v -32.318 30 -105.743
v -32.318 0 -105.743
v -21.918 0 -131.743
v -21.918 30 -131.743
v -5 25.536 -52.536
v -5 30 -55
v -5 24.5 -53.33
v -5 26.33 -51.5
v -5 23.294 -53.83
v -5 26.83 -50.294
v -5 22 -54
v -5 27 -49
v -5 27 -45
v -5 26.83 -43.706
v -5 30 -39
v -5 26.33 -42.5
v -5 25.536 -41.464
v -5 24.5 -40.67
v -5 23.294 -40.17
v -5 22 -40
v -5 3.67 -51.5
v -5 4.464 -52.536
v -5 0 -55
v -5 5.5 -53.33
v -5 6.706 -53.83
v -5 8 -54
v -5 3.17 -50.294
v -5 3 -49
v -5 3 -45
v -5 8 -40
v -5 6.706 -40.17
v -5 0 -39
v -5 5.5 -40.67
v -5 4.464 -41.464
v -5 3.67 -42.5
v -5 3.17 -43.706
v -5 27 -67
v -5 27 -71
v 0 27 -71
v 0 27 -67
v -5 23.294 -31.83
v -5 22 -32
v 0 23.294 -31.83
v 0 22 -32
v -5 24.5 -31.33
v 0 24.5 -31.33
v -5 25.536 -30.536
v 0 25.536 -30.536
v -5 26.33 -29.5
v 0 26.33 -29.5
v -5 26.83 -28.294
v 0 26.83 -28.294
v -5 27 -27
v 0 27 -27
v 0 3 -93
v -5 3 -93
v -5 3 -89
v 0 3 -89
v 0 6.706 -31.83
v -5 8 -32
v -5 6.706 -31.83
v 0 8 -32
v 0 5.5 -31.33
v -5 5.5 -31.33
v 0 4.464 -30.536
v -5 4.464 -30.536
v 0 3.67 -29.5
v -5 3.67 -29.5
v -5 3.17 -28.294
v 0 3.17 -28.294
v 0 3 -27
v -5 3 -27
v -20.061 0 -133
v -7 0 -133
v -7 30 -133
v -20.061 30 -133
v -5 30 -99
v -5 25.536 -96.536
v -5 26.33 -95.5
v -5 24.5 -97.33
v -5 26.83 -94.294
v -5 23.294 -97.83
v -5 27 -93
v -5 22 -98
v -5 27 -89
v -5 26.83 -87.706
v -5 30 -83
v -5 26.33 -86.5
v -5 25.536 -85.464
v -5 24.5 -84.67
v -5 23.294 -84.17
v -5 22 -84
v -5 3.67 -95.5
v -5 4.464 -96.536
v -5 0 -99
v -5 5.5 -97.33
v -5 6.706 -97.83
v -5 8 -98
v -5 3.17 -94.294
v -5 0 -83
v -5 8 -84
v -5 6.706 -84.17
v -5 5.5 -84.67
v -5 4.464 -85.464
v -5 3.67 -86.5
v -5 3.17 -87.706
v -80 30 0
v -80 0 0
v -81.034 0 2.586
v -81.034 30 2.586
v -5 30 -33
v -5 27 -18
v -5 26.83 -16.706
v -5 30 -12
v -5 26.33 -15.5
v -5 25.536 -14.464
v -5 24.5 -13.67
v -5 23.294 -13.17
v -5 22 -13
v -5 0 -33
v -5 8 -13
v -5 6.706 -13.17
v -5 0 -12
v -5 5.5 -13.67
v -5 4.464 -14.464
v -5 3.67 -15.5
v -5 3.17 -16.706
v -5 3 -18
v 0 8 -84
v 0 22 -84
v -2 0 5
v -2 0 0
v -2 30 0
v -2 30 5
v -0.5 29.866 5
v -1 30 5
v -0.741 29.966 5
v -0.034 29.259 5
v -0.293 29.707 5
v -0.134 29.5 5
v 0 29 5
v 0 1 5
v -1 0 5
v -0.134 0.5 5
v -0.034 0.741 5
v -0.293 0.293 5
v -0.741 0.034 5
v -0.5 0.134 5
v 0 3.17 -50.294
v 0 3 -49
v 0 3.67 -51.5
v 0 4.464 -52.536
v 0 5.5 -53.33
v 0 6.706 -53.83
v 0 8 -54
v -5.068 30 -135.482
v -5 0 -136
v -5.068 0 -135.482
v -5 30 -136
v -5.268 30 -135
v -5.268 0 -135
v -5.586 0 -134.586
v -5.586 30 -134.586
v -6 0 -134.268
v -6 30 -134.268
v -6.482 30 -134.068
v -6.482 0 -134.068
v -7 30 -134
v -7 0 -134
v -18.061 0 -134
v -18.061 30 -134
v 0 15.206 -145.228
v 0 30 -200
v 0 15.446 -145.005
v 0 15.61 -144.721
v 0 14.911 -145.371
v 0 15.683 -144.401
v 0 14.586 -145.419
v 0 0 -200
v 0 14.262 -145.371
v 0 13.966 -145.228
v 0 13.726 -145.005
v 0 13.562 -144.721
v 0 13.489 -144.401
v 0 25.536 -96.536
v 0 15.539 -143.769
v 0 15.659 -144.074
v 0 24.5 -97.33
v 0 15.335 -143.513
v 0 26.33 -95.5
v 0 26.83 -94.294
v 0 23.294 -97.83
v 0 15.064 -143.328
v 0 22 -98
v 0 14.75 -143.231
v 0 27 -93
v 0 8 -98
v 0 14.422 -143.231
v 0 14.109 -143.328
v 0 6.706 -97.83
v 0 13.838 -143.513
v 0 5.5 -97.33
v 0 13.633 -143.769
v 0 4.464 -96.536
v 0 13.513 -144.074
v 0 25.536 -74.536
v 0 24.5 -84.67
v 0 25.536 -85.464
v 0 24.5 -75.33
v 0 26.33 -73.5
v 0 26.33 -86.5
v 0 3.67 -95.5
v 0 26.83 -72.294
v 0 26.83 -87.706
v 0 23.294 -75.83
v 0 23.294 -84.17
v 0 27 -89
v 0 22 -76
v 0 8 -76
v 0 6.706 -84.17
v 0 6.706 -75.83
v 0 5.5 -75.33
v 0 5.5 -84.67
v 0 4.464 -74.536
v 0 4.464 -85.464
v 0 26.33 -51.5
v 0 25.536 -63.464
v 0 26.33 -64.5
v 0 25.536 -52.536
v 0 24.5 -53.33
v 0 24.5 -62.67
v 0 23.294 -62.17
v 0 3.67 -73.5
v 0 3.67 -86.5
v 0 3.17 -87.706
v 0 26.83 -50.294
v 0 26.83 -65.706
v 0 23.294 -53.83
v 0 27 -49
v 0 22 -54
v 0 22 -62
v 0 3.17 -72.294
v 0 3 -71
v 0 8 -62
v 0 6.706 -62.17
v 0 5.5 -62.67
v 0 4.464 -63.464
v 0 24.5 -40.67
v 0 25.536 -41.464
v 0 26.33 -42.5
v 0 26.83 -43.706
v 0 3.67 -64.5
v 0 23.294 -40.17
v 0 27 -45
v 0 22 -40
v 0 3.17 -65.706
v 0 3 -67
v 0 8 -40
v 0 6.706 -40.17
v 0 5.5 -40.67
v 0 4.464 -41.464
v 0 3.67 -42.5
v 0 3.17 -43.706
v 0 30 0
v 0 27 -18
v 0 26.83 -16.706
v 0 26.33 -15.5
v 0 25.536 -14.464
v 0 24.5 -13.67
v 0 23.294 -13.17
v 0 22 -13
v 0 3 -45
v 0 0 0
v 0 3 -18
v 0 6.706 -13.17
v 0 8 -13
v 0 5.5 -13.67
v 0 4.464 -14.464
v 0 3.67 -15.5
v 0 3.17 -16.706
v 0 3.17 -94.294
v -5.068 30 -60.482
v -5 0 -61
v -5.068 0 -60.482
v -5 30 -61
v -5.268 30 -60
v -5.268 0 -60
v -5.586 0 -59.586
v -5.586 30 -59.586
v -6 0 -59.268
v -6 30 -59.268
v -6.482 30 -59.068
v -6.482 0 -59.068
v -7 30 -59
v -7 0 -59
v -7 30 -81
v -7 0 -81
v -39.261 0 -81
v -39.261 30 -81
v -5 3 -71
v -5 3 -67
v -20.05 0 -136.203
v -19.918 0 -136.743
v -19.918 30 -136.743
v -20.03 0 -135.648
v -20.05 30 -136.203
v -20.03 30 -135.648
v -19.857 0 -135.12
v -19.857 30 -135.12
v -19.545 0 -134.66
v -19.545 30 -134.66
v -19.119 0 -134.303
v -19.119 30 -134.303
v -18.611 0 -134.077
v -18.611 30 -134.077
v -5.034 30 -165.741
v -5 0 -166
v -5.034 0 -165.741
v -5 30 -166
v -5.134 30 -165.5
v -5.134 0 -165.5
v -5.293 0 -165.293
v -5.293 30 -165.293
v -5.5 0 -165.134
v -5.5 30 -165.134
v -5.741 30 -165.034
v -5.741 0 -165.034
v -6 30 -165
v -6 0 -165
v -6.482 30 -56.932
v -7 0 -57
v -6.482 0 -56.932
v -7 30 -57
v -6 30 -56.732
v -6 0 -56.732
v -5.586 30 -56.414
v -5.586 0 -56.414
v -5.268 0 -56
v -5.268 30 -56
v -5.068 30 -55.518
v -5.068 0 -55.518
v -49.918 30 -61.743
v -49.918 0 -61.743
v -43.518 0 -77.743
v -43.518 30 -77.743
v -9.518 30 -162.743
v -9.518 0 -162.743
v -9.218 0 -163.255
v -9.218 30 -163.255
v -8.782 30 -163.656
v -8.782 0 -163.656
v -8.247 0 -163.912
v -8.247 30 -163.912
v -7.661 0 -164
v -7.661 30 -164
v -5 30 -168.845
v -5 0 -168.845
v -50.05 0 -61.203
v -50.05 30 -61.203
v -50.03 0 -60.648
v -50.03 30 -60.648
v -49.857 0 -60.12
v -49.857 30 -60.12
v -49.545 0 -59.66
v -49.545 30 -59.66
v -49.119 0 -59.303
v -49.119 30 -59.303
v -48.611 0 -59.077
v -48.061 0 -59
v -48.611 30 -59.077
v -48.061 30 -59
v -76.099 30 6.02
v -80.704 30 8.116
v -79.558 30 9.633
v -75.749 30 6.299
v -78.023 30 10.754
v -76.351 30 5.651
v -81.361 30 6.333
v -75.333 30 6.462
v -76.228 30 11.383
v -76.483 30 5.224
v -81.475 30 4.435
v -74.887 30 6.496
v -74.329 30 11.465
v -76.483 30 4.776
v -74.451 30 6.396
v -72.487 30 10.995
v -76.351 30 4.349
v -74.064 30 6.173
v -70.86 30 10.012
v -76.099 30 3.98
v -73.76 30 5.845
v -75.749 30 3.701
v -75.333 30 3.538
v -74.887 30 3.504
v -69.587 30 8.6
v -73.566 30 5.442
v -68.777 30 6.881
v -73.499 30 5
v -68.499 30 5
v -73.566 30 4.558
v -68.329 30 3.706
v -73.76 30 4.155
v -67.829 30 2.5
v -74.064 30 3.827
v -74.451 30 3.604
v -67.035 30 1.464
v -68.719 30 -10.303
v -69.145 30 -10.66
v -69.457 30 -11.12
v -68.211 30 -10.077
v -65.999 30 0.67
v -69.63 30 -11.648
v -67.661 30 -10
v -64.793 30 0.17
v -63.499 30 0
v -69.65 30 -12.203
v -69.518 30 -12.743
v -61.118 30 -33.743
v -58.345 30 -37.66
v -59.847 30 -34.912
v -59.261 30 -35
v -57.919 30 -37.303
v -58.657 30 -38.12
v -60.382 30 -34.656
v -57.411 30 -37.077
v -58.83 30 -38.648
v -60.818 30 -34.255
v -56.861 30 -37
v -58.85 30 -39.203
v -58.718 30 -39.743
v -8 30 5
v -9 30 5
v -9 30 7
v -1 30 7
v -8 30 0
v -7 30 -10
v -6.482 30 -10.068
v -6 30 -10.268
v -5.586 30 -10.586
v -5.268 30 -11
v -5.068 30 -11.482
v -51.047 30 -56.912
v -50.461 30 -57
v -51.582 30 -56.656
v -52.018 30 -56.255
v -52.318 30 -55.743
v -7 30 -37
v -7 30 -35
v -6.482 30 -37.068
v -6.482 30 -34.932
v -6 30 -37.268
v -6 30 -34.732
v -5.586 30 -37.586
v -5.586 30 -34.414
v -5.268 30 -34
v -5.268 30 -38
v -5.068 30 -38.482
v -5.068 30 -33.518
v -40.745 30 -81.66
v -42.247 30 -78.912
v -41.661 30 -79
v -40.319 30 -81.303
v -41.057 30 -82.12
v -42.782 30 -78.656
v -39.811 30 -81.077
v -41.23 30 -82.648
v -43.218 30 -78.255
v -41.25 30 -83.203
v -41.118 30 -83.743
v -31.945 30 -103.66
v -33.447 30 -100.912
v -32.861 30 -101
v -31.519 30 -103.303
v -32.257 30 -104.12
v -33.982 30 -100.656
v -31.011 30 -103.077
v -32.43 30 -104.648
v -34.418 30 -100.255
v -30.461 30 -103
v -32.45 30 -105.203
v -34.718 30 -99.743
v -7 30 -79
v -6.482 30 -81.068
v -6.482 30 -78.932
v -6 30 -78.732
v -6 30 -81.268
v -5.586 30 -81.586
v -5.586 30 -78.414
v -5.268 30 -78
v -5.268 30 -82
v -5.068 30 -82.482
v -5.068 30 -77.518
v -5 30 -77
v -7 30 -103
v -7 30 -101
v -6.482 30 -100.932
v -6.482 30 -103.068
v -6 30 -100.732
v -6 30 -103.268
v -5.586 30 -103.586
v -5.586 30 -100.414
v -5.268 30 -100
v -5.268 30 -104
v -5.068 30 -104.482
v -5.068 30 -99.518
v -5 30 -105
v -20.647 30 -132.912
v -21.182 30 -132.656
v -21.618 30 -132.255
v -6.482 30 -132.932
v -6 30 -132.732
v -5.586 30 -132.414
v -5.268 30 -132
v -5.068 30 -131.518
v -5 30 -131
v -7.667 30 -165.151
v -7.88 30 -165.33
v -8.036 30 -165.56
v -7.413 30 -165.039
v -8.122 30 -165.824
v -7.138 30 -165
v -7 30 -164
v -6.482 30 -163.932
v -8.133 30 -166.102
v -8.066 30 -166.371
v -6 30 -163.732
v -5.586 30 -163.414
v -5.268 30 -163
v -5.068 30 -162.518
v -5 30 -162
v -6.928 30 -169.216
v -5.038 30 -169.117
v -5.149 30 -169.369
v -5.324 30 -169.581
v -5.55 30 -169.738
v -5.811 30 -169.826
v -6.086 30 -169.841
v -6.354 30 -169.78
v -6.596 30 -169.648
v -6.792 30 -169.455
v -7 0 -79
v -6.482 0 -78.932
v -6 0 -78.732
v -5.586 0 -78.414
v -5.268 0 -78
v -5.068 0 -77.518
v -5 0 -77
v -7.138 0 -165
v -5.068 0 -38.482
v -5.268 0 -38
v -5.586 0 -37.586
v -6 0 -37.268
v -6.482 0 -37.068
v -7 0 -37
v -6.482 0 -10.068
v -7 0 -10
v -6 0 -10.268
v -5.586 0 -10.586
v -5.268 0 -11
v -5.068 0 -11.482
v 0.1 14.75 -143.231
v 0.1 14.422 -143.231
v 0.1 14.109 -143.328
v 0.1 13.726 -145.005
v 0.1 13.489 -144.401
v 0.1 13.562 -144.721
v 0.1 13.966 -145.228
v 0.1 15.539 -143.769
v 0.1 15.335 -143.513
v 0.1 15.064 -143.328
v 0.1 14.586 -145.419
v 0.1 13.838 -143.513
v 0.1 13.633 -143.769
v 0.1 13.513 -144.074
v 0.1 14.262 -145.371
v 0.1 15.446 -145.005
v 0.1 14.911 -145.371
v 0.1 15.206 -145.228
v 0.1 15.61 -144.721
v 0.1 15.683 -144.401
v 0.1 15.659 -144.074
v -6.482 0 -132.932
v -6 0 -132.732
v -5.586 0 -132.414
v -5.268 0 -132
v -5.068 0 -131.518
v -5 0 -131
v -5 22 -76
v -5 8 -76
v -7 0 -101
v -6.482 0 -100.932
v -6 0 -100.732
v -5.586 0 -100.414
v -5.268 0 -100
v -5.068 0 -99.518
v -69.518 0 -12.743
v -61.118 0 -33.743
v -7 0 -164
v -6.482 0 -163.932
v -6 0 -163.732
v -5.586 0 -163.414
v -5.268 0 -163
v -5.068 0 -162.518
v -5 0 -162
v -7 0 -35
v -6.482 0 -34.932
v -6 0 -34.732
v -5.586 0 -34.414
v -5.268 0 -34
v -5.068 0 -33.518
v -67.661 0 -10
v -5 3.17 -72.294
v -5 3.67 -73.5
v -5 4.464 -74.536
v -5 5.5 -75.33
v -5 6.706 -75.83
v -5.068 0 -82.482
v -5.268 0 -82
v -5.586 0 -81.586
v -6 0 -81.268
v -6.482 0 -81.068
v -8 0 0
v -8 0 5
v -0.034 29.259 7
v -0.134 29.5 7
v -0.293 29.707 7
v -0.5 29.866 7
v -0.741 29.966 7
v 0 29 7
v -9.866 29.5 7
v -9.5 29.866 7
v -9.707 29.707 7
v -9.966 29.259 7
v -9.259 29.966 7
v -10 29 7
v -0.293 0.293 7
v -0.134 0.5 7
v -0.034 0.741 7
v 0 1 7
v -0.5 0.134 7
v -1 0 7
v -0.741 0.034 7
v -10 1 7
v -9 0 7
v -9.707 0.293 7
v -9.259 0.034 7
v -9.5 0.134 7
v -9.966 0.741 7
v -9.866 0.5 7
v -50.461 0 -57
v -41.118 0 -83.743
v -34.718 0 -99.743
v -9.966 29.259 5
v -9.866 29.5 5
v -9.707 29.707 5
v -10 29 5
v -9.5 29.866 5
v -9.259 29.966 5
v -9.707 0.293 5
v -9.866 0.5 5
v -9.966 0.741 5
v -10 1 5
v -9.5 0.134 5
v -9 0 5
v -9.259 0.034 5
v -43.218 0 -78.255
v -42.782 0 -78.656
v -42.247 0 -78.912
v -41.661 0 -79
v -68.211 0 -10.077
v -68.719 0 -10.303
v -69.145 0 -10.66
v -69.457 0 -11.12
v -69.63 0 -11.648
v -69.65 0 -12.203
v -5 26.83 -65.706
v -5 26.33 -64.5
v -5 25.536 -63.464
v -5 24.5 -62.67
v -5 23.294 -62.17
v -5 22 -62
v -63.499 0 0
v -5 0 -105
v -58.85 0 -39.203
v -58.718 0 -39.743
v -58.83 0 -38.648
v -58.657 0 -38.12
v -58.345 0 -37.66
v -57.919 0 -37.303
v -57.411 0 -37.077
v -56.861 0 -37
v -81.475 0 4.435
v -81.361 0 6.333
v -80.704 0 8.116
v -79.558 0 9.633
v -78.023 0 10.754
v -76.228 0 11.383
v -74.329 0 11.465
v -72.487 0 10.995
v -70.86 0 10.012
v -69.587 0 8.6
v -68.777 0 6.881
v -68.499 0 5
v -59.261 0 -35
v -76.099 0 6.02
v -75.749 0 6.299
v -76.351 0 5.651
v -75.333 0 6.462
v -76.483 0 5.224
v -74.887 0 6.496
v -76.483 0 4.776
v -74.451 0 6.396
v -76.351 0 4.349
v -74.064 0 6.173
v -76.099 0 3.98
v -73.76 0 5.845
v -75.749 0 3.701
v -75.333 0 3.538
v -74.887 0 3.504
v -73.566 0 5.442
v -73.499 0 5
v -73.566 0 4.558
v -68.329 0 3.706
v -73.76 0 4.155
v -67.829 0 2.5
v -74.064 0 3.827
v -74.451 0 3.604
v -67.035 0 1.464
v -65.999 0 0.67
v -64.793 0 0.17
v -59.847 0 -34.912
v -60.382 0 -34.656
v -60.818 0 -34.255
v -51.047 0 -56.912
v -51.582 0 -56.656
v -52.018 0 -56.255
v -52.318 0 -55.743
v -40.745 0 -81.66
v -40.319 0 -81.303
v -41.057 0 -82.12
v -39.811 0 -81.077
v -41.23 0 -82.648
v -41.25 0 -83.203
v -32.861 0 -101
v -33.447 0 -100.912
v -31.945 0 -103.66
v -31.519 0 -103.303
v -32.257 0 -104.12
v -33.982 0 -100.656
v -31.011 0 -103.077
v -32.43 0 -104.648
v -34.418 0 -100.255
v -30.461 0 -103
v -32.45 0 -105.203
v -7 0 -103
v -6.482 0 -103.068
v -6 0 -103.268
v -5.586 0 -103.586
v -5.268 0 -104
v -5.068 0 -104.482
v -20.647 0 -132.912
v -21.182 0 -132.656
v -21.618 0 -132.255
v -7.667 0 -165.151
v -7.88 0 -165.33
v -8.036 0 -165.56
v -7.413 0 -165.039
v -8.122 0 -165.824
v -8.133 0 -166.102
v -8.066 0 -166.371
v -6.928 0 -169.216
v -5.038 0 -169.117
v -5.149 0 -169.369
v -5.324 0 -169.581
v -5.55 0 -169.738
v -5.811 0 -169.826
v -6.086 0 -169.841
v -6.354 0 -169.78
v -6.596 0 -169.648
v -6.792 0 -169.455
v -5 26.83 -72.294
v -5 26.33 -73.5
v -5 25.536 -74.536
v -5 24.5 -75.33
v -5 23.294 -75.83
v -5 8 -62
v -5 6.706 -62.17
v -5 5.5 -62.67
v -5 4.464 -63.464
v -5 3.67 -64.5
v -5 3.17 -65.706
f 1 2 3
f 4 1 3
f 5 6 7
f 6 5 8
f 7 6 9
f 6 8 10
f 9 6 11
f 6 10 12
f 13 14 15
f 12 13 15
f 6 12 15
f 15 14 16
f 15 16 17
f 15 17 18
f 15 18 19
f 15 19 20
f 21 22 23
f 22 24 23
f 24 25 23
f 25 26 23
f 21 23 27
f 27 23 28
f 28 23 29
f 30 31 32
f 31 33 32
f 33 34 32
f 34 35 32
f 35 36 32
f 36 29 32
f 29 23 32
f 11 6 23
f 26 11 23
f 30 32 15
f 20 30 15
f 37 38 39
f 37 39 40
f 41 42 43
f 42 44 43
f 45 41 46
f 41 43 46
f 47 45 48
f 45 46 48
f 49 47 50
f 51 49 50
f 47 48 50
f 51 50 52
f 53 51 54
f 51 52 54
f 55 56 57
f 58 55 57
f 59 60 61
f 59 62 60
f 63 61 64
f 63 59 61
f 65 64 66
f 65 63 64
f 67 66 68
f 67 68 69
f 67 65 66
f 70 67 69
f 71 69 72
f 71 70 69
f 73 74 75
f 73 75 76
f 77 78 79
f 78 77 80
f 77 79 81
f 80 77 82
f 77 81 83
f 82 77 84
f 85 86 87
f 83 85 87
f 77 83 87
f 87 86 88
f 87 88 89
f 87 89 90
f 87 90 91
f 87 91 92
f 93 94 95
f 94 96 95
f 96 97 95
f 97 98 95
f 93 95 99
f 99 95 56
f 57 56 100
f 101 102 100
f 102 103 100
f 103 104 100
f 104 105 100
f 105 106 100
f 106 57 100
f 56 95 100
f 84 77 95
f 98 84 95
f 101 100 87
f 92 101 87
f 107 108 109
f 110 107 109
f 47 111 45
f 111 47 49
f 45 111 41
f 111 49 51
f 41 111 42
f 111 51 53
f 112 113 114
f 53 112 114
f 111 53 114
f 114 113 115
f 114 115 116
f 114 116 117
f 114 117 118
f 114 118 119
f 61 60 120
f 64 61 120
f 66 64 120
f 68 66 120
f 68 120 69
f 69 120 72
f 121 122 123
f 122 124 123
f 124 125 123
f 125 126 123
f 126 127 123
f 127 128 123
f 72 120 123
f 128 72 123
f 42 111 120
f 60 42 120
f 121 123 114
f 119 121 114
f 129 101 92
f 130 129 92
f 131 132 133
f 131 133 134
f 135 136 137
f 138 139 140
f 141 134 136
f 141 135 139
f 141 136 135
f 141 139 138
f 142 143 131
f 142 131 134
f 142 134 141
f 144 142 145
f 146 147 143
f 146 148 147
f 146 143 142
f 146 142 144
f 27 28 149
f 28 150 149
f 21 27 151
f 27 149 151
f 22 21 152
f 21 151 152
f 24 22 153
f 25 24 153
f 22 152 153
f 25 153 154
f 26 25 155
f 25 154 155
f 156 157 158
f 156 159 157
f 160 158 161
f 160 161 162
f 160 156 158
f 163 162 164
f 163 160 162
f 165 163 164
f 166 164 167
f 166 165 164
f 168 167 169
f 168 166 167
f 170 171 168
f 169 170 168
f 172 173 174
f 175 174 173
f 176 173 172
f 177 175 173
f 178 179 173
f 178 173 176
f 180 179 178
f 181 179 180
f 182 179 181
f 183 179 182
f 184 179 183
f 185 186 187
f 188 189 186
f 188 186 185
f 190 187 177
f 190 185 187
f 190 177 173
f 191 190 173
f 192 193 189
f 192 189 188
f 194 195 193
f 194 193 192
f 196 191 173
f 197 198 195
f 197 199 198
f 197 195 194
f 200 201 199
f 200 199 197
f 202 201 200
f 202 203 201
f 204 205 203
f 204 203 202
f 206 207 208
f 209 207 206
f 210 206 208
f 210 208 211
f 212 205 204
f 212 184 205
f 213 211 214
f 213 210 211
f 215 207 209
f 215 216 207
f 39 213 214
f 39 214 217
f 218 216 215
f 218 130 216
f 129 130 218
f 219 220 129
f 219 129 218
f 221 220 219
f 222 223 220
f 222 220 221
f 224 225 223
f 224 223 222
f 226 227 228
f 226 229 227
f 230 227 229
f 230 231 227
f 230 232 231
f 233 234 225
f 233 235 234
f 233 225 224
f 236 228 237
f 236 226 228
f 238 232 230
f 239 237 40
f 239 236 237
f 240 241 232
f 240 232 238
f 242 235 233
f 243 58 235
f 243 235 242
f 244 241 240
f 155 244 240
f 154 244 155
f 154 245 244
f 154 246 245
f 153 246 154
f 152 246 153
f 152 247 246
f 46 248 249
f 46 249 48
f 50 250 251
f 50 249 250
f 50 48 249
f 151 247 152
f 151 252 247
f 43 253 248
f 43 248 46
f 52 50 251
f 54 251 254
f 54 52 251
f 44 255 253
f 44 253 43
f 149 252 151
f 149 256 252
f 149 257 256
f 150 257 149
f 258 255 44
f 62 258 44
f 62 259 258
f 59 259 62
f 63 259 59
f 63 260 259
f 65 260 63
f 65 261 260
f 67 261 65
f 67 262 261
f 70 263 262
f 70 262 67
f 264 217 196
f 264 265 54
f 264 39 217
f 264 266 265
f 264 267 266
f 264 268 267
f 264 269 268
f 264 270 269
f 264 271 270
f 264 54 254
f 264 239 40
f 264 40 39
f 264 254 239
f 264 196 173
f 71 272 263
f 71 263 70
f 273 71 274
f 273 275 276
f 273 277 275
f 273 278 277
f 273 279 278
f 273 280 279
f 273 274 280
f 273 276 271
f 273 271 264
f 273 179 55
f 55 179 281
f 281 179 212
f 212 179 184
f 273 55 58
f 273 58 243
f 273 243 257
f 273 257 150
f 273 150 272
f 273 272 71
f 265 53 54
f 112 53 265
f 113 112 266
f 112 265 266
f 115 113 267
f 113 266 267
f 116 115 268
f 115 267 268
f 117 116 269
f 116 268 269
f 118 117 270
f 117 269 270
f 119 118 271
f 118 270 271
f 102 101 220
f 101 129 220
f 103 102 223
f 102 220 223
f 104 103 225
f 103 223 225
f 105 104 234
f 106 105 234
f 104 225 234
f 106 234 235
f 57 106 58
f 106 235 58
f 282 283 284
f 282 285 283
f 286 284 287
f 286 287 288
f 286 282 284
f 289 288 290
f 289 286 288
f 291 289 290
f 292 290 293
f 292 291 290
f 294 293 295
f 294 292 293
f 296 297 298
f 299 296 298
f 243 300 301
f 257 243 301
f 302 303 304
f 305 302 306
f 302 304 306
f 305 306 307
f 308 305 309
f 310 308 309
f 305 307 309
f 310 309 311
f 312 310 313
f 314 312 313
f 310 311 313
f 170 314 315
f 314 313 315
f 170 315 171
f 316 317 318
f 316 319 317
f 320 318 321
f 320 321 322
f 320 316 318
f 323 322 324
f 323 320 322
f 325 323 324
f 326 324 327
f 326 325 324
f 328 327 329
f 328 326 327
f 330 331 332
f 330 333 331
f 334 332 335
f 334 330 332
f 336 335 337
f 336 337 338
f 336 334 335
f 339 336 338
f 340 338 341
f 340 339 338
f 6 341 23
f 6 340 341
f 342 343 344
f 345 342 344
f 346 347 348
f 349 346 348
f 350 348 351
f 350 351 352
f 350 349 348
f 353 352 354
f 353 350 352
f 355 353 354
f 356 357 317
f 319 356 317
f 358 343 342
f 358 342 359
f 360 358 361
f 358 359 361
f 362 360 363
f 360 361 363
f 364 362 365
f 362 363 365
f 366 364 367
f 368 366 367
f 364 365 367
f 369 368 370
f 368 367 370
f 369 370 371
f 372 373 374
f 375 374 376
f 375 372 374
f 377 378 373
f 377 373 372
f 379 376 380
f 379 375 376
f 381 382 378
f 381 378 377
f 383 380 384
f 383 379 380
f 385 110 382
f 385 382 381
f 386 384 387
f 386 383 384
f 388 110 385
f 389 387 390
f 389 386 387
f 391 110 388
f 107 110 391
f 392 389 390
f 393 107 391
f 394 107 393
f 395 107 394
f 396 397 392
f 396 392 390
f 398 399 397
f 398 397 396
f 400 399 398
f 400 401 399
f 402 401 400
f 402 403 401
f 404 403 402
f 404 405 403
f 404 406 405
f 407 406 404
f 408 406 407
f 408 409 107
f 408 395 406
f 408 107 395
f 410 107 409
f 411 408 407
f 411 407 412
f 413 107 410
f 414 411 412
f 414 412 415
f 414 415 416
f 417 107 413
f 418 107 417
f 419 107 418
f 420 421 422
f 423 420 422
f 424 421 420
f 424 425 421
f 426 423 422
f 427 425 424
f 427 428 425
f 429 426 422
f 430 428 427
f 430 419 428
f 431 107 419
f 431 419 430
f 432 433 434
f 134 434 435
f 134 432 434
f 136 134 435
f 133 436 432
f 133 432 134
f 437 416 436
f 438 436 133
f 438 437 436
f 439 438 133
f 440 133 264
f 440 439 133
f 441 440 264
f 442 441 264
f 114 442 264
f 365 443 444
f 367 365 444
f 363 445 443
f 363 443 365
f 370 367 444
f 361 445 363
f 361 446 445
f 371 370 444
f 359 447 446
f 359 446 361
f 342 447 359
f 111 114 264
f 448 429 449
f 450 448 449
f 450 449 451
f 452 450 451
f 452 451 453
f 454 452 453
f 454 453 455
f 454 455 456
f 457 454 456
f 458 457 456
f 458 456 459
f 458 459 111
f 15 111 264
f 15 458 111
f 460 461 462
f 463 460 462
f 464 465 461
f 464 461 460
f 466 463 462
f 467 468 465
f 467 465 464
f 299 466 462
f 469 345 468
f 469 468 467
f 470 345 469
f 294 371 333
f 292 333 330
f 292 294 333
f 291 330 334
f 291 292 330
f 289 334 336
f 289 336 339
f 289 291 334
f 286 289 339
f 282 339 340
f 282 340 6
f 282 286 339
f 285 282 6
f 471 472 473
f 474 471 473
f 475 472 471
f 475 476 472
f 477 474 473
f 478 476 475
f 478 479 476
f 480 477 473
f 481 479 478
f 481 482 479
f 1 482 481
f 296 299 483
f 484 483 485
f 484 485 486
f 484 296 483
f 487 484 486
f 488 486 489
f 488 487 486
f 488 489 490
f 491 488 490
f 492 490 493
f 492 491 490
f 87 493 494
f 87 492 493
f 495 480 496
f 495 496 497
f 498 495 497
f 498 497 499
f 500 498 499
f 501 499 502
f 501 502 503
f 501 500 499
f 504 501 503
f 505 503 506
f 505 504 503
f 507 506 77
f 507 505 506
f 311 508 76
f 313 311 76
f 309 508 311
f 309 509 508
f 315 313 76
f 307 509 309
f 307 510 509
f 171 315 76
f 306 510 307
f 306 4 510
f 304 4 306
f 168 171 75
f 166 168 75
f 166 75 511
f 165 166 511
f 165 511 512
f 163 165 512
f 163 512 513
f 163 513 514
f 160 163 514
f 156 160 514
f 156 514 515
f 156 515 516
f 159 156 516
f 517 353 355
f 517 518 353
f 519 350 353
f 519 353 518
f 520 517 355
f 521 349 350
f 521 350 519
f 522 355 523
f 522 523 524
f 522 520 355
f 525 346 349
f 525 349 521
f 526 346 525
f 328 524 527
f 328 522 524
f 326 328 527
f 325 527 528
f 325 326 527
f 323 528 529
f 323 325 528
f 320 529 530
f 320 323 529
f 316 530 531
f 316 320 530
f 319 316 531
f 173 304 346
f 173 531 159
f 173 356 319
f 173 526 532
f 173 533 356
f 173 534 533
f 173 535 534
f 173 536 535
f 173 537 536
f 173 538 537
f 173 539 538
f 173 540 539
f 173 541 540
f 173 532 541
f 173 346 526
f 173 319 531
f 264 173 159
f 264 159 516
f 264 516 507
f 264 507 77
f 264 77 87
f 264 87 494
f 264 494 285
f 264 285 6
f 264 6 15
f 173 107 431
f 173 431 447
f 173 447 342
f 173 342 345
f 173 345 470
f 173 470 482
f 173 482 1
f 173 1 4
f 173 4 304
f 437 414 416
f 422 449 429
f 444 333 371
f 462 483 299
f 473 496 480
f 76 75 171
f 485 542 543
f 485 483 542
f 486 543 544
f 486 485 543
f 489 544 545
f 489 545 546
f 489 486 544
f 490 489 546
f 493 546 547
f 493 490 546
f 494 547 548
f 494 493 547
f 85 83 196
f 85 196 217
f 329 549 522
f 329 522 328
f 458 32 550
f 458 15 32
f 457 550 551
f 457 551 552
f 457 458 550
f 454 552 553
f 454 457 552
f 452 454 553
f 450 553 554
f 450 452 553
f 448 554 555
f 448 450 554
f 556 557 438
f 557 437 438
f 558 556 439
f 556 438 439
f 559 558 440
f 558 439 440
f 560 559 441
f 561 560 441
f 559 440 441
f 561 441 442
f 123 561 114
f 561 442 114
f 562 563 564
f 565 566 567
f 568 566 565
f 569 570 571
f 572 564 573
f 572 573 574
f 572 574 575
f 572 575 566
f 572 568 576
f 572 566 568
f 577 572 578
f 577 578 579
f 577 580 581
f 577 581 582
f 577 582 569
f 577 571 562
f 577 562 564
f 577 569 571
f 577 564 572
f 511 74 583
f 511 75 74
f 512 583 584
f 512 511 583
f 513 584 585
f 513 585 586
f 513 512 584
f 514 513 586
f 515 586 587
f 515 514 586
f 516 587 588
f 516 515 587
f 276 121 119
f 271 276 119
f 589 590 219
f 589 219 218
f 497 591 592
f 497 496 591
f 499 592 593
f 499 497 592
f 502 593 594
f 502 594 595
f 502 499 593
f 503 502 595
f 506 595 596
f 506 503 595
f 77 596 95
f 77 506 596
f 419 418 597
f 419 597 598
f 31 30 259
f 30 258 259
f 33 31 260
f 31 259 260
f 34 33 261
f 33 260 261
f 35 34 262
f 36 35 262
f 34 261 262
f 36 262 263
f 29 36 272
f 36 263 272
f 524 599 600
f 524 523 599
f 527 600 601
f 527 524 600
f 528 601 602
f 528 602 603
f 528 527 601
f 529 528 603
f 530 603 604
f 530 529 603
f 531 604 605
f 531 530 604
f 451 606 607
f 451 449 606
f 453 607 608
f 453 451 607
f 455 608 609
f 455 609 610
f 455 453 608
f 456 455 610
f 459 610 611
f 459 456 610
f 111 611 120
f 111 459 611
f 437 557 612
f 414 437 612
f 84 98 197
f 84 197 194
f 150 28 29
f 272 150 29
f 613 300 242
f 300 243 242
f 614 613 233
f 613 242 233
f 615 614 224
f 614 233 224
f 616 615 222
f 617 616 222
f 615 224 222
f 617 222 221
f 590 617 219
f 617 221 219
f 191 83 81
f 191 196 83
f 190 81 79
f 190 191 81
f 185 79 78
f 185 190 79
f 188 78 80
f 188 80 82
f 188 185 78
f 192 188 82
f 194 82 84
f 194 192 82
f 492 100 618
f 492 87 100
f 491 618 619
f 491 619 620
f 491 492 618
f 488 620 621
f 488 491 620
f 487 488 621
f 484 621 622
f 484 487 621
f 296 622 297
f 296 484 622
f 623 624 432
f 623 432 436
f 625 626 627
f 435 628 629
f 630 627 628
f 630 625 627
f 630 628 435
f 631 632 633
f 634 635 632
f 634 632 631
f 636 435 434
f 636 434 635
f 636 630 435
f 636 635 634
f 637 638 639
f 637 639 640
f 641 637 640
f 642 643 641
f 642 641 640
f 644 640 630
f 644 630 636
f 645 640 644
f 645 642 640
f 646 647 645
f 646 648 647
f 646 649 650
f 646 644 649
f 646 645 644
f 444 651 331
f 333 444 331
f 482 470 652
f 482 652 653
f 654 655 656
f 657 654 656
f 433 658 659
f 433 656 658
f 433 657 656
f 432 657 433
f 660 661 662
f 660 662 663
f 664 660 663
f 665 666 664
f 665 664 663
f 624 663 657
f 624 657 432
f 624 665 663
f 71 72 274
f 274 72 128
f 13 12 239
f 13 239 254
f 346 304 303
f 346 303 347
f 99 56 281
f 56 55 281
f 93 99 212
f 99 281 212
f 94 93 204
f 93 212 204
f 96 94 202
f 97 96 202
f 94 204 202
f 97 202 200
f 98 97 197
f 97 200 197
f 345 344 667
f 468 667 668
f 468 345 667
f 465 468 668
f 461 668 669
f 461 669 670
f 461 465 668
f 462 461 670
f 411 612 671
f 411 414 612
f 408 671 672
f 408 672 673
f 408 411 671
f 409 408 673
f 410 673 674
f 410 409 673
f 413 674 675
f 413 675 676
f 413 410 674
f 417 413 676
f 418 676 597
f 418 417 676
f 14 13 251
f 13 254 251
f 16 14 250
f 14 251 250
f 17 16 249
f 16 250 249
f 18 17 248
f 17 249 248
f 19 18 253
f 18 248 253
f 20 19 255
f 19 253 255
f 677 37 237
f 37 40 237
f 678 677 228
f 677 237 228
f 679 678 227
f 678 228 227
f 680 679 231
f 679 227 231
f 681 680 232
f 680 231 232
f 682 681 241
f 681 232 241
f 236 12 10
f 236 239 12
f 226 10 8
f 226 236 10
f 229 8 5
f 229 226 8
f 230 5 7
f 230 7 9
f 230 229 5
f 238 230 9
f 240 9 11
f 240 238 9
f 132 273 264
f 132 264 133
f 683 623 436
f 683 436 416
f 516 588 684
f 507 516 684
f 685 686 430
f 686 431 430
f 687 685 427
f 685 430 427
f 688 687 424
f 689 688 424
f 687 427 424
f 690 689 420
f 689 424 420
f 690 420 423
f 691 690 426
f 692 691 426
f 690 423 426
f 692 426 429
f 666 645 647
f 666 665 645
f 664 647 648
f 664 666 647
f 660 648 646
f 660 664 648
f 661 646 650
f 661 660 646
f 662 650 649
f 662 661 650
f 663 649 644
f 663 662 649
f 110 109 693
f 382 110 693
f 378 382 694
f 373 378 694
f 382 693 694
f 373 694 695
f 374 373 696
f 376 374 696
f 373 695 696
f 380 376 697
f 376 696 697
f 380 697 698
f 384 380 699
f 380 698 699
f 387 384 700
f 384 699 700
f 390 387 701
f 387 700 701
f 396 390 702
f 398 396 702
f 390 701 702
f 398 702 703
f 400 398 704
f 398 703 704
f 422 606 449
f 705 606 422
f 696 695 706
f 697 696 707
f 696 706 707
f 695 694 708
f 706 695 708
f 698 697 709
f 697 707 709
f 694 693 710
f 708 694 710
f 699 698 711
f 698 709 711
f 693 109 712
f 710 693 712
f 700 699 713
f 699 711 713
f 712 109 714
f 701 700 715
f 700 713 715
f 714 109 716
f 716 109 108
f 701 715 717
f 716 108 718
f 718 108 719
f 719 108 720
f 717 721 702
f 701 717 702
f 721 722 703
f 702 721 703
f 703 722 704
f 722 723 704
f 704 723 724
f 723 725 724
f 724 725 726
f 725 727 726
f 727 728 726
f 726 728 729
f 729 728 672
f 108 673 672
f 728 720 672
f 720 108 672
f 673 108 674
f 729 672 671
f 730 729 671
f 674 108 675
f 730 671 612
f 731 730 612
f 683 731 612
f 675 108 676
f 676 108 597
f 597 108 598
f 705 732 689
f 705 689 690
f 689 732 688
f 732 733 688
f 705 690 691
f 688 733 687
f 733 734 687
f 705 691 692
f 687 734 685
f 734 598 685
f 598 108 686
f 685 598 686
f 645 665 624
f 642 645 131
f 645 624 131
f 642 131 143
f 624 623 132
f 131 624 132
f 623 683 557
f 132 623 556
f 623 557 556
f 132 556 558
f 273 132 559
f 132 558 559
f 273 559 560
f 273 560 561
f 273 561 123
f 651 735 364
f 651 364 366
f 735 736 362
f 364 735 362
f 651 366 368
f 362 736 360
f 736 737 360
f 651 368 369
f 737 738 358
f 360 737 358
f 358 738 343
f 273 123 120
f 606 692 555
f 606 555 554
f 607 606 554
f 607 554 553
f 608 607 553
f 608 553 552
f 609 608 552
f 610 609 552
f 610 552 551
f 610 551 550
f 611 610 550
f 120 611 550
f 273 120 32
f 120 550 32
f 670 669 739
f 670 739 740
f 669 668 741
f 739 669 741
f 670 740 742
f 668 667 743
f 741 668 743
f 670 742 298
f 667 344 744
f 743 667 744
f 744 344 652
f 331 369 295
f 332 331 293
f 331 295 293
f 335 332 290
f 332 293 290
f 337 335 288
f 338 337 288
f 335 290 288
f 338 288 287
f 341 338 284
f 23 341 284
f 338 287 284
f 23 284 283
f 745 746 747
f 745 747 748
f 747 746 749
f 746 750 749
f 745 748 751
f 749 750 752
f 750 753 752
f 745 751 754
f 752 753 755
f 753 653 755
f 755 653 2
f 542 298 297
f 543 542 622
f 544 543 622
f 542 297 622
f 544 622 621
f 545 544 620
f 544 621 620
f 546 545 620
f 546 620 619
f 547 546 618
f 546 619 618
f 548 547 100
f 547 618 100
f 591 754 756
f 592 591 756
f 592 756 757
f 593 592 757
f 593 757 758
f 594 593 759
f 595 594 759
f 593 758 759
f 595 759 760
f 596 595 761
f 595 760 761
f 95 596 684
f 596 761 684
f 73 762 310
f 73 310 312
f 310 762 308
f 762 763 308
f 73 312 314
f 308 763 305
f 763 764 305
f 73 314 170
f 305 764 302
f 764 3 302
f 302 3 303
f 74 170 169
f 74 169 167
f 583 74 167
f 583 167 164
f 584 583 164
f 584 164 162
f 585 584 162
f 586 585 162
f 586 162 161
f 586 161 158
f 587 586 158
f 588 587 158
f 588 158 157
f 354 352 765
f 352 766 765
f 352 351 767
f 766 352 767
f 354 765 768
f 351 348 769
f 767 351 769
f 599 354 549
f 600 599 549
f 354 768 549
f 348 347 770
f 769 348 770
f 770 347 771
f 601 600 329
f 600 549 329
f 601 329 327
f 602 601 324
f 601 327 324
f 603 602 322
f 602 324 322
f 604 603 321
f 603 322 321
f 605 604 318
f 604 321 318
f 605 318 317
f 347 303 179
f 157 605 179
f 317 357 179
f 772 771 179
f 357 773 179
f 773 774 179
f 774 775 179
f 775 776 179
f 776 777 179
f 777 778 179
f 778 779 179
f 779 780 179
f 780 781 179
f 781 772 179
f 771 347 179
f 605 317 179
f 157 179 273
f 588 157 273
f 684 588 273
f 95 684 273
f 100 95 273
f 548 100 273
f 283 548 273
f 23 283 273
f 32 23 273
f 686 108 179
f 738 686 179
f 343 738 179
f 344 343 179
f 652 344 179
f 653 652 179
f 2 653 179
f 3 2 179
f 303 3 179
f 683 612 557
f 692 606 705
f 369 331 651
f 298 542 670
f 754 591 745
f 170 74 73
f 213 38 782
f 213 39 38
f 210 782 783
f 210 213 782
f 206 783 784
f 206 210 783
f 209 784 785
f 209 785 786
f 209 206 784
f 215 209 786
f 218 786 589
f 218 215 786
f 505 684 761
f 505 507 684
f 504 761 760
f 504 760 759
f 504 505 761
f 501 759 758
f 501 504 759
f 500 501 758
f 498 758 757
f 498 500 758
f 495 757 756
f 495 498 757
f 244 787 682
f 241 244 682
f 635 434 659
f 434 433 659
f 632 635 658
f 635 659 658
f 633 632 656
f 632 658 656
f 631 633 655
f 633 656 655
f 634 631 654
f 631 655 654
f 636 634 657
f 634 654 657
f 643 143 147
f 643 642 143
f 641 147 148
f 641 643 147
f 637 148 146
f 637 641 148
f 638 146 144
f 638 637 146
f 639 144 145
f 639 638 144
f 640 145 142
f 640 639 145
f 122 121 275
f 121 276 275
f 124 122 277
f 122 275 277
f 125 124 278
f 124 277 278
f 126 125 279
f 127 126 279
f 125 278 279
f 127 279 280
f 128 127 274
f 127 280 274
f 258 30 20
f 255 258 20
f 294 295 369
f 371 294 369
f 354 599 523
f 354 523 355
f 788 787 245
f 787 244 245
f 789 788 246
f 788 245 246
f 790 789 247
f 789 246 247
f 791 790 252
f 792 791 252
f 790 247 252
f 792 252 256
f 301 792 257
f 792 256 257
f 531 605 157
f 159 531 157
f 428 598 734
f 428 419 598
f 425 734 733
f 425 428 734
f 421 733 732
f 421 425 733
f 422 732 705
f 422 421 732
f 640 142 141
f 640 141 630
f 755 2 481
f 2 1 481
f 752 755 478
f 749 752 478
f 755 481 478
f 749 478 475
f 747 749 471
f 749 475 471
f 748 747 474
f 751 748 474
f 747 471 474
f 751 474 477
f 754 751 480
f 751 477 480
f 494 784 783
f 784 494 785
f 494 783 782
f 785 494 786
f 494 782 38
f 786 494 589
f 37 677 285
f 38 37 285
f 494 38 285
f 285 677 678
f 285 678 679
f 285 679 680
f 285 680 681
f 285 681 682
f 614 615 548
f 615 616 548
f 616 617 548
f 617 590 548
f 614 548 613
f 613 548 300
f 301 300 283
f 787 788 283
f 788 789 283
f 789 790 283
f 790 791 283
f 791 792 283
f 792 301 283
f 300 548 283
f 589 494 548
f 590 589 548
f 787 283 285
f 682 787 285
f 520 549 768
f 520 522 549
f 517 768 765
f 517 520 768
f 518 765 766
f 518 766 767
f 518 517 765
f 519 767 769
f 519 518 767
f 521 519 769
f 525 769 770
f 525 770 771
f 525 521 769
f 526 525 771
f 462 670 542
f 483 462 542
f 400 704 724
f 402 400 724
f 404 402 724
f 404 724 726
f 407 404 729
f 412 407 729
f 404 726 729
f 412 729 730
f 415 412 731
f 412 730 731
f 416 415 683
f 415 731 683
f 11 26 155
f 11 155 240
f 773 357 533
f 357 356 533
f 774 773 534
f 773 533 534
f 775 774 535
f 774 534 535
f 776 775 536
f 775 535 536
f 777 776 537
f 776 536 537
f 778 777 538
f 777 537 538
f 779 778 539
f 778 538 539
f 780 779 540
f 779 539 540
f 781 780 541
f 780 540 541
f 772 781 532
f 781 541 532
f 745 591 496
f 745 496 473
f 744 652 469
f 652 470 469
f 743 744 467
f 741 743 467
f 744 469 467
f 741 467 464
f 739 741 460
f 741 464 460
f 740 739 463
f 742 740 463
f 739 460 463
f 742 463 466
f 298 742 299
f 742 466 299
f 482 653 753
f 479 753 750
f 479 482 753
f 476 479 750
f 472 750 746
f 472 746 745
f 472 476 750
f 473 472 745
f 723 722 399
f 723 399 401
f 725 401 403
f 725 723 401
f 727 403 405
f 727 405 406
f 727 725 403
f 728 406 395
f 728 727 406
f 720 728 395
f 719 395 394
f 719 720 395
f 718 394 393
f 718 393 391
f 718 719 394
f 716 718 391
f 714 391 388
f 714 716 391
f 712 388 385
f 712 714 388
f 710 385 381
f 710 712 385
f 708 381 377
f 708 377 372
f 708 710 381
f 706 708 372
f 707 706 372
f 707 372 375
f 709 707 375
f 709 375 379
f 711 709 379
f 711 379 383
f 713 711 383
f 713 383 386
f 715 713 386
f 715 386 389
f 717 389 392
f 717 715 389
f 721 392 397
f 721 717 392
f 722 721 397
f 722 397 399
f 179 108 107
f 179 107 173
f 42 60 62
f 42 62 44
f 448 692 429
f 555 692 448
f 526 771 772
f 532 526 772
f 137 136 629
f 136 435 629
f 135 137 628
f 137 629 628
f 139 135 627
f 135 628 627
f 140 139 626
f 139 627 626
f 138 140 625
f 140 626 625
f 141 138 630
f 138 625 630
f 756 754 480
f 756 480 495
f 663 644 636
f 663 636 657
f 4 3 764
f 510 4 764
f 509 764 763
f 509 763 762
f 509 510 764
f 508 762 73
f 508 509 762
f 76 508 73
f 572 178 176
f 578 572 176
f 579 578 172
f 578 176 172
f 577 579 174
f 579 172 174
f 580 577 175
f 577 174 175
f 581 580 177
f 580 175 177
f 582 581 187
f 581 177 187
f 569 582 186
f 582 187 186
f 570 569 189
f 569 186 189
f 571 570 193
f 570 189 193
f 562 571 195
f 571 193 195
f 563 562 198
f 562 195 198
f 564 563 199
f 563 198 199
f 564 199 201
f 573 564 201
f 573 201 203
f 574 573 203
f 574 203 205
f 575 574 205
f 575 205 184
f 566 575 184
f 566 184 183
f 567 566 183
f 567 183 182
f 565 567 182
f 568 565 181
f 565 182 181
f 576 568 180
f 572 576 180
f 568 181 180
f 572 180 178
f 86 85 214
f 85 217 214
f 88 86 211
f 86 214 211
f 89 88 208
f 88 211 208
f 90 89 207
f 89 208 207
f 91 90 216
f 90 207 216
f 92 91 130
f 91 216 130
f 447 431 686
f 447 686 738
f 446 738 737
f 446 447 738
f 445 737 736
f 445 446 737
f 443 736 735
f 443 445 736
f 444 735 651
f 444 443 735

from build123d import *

# Parameters (mm, degrees)
BOSS_EXTRUDE1_DEPTH = 30
BOSS_EXTRUDE2_DEPTH = 30
SKETCH3_R           = 1.5
BOSS_EXTRUDE3_DEPTH = 30
SKETCH4_R           = 1.100328426
BOSS_EXTRUDE4_DEPTH = 0.1
SKETCH5_W           = 14
SKETCH5_H           = 24
SKETCH5_W_2         = 19
CUT_EXTRUDE1_DEPTH  = 6.1
FILLET1_R           = 2
FILLET2_R           = 1
FILLET3_R           = 5
FILLET4_R           = 1


with BuildPart() as part:
    # Sketch1 → Boss-Extrude1 (new body)
    with BuildSketch(Plane(origin=(0, 0, 0), x_dir=(1, 0, 0), z_dir=(0, 1, 0))):
        Polygon((0, 0), (-80, 0), (0, 200), align=None)
        Polygon((-5, 10), (-70.614835193, 10), (-5, 174.037087982), align=None, mode=Mode.SUBTRACT)
    extrude(amount=BOSS_EXTRUDE1_DEPTH)

    # Sketch2 → Boss-Extrude2 (add)
    with BuildSketch(Plane(origin=(0, 0, 0), x_dir=(1, 0, 0), z_dir=(0, 1, 0))):
        Polygon((-5, 35), (-60.614835193, 35), (-59.814835193, 37), (-5, 37), align=None)
        Polygon((-51.014835193, 59), (-51.814835193, 57), (-5, 57), (-5, 59), align=None)
        Polygon((-43.014835193, 79), (-5, 79), (-5, 81), (-42.214835193, 81), align=None)
        Polygon((-34.214835193, 101), (-33.414835193, 103), (-5, 103), (-5, 101), align=None)
        Polygon((-21.414835193, 133), (-21.014835193, 134), (-5, 134), (-5, 133), align=None)
        Polygon((-9.014835193, 164), (-8.614835193, 165), (-5, 165), (-5, 164), align=None)
    extrude(amount=BOSS_EXTRUDE2_DEPTH)

    # Sketch3 → Boss-Extrude3 (add)
    with BuildSketch(Plane(origin=(0, 0, 0), x_dir=(1, 0, 0), z_dir=(0, 1, 0))):
        Polygon((-2, 0), (-2, -5), (0, -5), (0, -7), (-10, -7), (-10, -5), (-8, -5), (-8, 0), align=None)
        with BuildLine():
            Line((-80, 0), (-81.034384241, -2.585960604))
            ThreePointArc((-81.034384241, -2.585960604), (-76.228484638, -11.382716514), (-68.499285751, -5))
            ThreePointArc((-68.499285751, -5), (-67.034819657, -1.464466094), (-63.499285751, 0))
            Line((-63.499285751, 0), (-80, 0))
        make_face()
        with Locations((-74.999285751, -5)):
            Circle(SKETCH3_R, mode=Mode.SUBTRACT)
    extrude(amount=BOSS_EXTRUDE3_DEPTH)

    # Sketch4 → Boss-Extrude4 (add)
    with BuildSketch(Plane(origin=(0, 0, 0), x_dir=(0, 0, -1), z_dir=(1, 0, 0))):
        with Locations((144.319162345, 14.586186638)):
            Circle(SKETCH4_R)
    extrude(amount=BOSS_EXTRUDE4_DEPTH)

    # Sketch5 → Cut-Extrude1 (cut, through all)
    with BuildSketch(Plane.ZY.offset(5)):
        with Locations((-91, 15)):
            Rectangle(SKETCH5_W, SKETCH5_H)
        with Locations((-69, 15)):
            Rectangle(SKETCH5_W, SKETCH5_H)
        with Locations((-47, 15)):
            Rectangle(SKETCH5_W, SKETCH5_H)
        with Locations((-22.5, 15)):
            Rectangle(SKETCH5_W_2, SKETCH5_H)
    extrude(amount=-CUT_EXTRUDE1_DEPTH, mode=Mode.SUBTRACT)

    # Fillet1
    fillet1_edges = [part.edges().sort_by_distance(p)[0] for p in [
        (-5, 15, -10),
        (-70.614835193, 15, -10),
        (-60.614835193, 15, -35),
        (-59.814835193, 15, -37),
        (-5, 15, -37),
        (-5, 15, -35),
        (-5, 15, -57),
        (-51.814835193, 15, -57),
        (-51.014835193, 15, -59),
        (-5, 15, -59),
        (-5, 15, -81),
        (-5, 15, -79),
        (-43.014835193, 15, -79),
        (-42.214835193, 15, -81),
        (-33.414835193, 15, -103),
        (-5, 15, -103),
        (-5, 15, -101),
        (-34.214835193, 15, -101),
        (-21.014835193, 15, -134),
        (-5, 15, -134),
        (-5, 15, -133),
        (-21.414835193, 15, -133),
        (-5, 15, -164),
        (-9.014835193, 15, -164),
    ]]
    fillet(fillet1_edges, radius=FILLET1_R)

    # Fillet2
    fillet2_edges = [part.edges().sort_by_distance(p)[0] for p in [
        (-5, 15, -174.037087982),
        (-8.614835193, 15, -165),
        (-5, 15, -165),
    ]]
    fillet(fillet2_edges, radius=FILLET2_R)

    # Fillet3
    fillet3_edges = [part.edges().sort_by_distance(p)[0] for p in [
        (-2.5, 27, -84),
        (-2.5, 3, -84),
        (-2.5, 3, -98),
        (-2.5, 27, -98),
        (-2.5, 27, -62),
        (-2.5, 3, -62),
        (-2.5, 3, -76),
        (-2.5, 27, -76),
        (-2.5, 27, -40),
        (-2.5, 3, -40),
        (-2.5, 3, -54),
        (-2.5, 27, -54),
        (-2.5, 27, -13),
        (-2.5, 3, -13),
        (-2.5, 3, -32),
        (-2.5, 27, -32),
    ]]
    fillet(fillet3_edges, radius=FILLET3_R)

    # Fillet4
    fillet4_edges = [part.edges().sort_by_distance(p)[0] for p in [
        (0, 30, 6),
        (0, 0, 6),
        (-10, 30, 6),
        (-10, 0, 6),
    ]]
    fillet(fillet4_edges, radius=FILLET4_R)


solid = part.part
